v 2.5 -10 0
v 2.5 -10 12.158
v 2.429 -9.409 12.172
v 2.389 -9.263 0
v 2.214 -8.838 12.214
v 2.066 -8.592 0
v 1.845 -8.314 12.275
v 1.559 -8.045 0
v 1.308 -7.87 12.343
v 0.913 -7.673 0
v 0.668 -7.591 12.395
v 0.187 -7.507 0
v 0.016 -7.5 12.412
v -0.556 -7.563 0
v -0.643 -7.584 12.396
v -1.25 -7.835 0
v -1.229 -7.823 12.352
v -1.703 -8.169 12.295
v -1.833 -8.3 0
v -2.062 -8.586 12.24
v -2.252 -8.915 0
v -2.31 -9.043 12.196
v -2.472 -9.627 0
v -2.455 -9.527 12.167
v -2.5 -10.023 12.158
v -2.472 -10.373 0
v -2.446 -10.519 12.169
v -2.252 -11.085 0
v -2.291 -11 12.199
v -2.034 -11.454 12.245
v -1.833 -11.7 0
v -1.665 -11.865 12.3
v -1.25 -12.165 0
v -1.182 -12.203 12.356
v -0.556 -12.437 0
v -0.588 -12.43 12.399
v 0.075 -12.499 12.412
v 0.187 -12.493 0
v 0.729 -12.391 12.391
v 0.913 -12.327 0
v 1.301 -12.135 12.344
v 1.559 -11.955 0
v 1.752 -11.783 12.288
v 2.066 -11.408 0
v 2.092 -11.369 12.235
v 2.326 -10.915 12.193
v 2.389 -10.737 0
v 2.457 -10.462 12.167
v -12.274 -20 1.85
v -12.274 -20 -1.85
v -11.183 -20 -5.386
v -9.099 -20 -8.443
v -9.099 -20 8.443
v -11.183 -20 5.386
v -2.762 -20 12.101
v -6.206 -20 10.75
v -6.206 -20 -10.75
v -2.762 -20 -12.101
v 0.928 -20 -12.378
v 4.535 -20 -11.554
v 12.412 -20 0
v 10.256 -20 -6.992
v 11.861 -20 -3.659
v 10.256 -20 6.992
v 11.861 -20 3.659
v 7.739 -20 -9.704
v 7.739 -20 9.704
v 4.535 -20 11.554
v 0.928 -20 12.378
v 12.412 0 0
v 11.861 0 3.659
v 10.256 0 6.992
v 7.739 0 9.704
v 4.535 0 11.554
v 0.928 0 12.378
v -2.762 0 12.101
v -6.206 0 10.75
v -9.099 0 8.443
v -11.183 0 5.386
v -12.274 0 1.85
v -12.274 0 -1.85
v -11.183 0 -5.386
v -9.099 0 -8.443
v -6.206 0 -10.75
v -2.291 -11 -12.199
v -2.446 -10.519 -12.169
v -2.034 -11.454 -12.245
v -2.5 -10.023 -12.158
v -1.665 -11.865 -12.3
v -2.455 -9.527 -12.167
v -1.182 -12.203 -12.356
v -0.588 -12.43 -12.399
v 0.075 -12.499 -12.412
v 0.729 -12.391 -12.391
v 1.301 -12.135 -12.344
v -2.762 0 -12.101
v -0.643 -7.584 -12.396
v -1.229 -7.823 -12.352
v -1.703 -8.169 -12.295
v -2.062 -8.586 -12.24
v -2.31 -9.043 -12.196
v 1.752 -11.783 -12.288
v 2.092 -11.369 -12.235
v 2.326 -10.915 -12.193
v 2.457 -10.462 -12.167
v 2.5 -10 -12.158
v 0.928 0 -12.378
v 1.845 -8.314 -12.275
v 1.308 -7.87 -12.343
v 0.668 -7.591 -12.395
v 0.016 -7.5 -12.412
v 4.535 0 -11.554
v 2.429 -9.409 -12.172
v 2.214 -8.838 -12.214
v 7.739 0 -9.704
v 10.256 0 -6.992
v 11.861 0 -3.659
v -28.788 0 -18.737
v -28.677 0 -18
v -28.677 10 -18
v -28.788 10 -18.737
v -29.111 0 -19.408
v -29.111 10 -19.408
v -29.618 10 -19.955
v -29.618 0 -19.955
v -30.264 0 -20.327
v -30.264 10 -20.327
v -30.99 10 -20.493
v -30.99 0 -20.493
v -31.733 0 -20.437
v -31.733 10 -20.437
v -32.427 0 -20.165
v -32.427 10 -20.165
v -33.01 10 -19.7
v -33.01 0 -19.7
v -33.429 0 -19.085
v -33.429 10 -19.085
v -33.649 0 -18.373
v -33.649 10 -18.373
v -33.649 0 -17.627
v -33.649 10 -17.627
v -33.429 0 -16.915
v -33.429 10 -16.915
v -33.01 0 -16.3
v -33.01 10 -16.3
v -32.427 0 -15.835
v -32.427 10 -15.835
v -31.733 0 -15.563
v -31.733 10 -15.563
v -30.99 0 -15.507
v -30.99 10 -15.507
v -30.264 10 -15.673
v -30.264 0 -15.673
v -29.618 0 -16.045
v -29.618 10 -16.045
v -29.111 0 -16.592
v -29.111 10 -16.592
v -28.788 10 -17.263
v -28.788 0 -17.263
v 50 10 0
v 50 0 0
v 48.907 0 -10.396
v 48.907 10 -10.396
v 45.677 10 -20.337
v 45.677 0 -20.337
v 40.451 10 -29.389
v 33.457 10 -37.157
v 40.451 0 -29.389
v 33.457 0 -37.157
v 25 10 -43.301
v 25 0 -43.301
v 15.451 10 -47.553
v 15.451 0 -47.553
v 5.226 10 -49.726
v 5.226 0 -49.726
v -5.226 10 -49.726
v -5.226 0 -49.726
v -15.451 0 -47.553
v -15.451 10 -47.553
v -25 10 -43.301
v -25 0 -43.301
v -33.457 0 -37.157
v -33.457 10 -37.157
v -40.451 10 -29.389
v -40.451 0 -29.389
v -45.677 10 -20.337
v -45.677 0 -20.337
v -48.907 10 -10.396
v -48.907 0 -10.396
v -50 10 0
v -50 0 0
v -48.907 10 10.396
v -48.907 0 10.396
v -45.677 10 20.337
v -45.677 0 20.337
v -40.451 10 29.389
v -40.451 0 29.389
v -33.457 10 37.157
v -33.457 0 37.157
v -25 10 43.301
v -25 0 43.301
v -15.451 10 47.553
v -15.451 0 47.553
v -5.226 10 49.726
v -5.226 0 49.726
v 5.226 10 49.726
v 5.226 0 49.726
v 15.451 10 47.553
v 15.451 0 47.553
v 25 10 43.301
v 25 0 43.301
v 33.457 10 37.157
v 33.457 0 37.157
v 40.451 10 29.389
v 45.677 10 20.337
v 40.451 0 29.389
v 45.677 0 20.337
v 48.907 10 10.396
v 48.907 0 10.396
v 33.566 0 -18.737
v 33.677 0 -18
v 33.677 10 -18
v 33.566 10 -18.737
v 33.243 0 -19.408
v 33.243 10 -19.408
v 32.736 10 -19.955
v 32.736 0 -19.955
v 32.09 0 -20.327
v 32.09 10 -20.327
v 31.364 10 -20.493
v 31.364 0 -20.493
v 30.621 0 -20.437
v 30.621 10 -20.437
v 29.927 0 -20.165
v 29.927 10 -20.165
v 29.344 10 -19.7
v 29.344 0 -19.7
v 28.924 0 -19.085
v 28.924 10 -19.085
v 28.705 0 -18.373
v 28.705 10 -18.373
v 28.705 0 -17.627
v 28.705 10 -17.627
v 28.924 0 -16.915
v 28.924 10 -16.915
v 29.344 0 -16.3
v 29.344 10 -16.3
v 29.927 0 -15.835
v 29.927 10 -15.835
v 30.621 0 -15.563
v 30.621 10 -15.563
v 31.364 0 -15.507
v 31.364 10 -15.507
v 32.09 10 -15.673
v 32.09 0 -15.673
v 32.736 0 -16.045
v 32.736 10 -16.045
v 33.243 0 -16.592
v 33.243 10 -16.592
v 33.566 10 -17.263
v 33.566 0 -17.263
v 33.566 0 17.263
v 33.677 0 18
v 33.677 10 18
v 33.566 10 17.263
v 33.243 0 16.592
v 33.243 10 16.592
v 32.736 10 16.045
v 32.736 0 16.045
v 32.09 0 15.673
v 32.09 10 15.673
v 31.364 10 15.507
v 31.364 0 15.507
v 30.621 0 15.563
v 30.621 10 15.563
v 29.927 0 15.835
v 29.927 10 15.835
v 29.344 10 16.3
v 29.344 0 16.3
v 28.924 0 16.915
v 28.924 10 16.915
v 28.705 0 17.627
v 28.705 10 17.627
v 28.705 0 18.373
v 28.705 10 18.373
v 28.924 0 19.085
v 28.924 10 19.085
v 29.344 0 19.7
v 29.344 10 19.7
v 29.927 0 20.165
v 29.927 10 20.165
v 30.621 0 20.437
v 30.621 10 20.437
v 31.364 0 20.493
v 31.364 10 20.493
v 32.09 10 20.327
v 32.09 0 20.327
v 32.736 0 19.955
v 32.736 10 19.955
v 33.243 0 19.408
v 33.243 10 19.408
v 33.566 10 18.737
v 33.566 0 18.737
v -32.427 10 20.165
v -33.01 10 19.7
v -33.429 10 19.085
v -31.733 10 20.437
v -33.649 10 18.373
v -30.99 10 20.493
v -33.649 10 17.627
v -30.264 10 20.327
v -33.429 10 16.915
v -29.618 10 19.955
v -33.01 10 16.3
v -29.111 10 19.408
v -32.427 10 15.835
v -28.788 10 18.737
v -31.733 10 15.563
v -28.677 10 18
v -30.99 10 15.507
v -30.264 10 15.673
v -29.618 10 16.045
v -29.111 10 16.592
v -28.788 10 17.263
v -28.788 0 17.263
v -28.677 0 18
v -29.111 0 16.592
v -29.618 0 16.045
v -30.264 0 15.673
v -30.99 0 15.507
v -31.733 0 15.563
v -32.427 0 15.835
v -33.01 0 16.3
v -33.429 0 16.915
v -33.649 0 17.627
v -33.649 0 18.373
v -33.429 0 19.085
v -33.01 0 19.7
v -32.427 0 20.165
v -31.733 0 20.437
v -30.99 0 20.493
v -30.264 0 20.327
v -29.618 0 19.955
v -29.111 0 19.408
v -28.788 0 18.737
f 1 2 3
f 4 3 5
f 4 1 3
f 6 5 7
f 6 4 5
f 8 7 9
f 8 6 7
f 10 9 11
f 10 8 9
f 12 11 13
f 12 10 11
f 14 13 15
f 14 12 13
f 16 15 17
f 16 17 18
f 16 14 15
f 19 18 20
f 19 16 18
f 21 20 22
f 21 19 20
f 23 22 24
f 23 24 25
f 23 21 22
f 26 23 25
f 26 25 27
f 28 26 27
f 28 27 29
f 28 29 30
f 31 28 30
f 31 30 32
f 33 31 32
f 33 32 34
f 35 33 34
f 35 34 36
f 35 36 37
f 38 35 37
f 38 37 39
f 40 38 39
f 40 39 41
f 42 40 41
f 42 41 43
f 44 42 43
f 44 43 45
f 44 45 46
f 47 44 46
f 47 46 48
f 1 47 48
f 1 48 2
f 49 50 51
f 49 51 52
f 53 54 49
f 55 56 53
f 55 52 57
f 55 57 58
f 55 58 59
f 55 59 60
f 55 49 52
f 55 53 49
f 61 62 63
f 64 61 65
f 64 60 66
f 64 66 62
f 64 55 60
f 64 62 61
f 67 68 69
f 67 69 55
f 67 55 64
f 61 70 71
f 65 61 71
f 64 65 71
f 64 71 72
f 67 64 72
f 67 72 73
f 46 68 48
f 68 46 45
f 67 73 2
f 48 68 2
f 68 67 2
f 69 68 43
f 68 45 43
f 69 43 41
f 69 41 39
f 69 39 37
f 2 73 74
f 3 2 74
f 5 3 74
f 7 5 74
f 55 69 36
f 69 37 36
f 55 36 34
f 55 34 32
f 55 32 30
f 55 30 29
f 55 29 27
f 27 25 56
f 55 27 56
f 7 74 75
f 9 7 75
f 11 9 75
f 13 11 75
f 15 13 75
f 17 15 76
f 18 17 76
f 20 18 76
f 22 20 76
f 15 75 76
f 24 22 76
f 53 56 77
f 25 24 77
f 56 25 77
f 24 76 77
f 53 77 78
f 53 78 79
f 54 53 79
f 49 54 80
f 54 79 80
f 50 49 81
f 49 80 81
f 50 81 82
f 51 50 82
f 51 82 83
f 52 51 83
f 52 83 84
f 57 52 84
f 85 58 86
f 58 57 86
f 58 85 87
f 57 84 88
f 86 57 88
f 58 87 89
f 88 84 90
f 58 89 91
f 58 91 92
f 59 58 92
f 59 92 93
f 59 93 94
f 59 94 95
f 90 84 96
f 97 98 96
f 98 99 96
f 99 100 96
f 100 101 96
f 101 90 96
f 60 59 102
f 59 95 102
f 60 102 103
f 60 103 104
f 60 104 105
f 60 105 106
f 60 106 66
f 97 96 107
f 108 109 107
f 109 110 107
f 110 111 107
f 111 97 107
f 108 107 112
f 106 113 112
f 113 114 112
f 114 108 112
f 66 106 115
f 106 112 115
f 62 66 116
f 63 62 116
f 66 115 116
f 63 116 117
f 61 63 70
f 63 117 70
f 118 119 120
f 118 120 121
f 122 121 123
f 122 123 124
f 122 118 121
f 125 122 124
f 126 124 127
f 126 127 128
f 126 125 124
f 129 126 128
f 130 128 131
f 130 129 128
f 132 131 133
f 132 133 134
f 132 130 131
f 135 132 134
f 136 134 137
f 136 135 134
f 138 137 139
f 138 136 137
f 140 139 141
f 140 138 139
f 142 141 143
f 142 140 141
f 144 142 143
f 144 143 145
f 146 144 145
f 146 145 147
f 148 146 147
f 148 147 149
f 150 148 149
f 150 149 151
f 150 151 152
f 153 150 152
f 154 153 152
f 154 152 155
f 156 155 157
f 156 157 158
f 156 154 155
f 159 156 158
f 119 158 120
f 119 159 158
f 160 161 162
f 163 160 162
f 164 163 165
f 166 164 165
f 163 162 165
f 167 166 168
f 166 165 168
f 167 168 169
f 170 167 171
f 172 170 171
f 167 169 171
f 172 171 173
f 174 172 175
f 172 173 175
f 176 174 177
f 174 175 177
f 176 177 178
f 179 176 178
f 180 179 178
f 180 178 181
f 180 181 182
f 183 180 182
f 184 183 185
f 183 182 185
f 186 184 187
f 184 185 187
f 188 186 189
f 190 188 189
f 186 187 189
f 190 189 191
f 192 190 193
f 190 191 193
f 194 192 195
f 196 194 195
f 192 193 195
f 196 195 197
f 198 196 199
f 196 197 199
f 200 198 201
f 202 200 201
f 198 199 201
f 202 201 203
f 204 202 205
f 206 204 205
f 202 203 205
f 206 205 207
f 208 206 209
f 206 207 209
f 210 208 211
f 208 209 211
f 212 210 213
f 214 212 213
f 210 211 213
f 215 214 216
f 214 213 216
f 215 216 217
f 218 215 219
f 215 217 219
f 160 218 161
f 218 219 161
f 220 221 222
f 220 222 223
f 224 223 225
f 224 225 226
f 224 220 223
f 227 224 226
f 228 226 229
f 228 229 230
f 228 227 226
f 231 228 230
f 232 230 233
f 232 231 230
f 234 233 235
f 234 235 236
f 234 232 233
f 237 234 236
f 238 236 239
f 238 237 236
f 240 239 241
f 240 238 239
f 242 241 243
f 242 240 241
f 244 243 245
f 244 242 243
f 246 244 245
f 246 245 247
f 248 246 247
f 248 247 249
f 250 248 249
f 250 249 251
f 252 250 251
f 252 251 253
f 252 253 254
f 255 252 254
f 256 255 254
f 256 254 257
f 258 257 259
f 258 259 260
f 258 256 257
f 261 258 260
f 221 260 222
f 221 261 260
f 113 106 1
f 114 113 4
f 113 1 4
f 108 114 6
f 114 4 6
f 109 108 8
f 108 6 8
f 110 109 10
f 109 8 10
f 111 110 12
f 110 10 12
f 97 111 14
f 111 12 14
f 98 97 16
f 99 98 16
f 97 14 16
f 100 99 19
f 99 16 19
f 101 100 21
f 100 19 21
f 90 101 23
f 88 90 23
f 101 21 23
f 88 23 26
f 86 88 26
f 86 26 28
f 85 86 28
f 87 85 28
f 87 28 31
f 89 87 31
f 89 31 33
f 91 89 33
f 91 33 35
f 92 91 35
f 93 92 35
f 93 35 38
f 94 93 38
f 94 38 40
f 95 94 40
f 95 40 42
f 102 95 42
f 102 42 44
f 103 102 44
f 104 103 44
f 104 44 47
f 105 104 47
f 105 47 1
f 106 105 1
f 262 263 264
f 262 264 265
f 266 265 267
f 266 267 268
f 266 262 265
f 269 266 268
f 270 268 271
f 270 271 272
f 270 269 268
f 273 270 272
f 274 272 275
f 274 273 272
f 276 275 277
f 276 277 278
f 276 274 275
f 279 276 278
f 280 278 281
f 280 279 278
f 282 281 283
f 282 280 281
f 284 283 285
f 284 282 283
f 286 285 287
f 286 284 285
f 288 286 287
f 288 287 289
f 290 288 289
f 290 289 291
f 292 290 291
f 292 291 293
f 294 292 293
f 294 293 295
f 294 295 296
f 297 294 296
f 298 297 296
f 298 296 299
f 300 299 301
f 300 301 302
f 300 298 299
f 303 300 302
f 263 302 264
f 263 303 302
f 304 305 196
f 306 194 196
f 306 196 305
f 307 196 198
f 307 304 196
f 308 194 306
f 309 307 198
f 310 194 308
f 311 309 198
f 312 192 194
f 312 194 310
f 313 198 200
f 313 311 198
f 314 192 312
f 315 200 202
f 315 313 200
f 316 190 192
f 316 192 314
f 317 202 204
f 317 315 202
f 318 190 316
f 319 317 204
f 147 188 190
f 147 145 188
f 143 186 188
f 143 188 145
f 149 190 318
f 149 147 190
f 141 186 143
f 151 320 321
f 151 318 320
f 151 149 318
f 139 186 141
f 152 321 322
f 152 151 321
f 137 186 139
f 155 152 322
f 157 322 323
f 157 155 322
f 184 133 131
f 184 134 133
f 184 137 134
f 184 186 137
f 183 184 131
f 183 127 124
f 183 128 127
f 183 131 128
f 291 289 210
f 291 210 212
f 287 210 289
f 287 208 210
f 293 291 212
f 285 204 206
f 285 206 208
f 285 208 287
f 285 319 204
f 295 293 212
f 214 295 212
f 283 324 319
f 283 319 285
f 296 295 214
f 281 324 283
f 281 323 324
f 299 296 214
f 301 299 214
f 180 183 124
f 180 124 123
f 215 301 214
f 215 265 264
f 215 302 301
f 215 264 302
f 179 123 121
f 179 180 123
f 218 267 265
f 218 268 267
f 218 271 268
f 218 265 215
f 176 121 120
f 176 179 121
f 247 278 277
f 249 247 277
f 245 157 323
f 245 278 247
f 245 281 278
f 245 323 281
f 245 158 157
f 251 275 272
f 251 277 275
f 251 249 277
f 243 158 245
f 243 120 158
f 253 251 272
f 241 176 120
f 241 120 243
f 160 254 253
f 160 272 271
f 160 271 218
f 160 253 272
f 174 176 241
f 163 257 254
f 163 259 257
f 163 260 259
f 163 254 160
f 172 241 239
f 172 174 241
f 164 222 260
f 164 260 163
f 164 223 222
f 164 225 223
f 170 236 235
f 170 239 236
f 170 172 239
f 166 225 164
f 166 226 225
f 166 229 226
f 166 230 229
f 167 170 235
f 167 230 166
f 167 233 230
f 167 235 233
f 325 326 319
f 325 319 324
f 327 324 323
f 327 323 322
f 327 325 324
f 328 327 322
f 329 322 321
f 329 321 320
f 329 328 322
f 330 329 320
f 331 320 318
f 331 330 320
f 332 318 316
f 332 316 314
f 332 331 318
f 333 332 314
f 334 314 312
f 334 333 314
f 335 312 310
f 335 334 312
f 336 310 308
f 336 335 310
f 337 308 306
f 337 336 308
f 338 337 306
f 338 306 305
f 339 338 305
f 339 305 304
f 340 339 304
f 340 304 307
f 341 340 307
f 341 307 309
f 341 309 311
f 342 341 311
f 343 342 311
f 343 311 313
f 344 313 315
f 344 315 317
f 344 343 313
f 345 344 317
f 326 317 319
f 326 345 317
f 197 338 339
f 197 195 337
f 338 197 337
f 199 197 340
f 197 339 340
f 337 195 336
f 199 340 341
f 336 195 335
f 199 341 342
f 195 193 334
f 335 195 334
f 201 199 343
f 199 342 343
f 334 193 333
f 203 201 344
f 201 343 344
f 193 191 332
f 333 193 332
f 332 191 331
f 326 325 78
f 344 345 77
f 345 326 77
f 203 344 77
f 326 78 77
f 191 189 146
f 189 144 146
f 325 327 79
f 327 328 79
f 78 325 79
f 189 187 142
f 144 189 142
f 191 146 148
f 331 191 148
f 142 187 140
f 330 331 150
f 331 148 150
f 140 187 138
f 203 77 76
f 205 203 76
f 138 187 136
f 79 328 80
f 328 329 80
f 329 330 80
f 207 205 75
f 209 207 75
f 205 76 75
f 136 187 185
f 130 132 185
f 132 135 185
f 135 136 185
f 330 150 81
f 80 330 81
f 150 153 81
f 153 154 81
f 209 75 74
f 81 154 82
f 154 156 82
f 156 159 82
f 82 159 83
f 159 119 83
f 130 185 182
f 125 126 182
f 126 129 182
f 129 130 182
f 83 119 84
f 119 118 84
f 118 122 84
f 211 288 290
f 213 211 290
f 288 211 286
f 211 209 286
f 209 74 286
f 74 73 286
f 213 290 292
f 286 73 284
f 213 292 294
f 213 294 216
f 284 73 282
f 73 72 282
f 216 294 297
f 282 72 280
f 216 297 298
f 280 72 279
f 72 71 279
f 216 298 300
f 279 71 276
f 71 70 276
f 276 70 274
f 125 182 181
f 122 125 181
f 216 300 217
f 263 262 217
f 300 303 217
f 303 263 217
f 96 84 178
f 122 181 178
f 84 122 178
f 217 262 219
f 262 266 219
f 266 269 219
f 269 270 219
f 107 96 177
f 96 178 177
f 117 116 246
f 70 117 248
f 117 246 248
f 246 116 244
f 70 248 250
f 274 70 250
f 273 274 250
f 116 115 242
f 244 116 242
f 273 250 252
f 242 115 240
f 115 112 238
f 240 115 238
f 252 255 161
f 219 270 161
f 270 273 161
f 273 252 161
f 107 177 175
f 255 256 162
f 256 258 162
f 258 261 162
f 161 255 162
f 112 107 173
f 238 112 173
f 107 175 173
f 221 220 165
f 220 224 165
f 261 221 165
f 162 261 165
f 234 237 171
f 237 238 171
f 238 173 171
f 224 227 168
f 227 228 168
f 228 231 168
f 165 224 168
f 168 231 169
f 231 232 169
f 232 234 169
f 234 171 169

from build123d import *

# Parameters (mm, degrees)
SKETCH2_R               = 50
SKETCH2_R_2             = 2.5
BOSS_EXTRUDE1_DEPTH     = 10
SKETCH3_R               = 12.4125
BOSS_EXTRUDE2_DEPTH     = 20
SKETCH4_R               = 2.5
CUT_EXTRUDE1_DEPTH      = 51
CUT_EXTRUDE1_DEPTH_BACK = 51


with BuildPart() as part:
    # Sketch2 → Boss-Extrude1 (new body)
    with BuildSketch(Plane(origin=(0, 0, 0), x_dir=(1, 0, 0), z_dir=(0, 1, 0))):
        Circle(SKETCH2_R)
        with Locations((-31.176914536, 18)):
            Circle(SKETCH2_R_2, mode=Mode.SUBTRACT)
        with Locations((-31.176914536, -18)):
            Circle(SKETCH2_R_2, mode=Mode.SUBTRACT)
        with Locations((31.176914536, 18)):
            Circle(SKETCH2_R_2, mode=Mode.SUBTRACT)
        with Locations((31.176914536, -18)):
            Circle(SKETCH2_R_2, mode=Mode.SUBTRACT)
    extrude(amount=BOSS_EXTRUDE1_DEPTH)

    # Sketch3 → Boss-Extrude2 (add)
    with BuildSketch(Plane.XZ):
        Circle(SKETCH3_R)
    extrude(amount=BOSS_EXTRUDE2_DEPTH)

    # Sketch4 → Cut-Extrude1 (cut, two sides)
    with BuildSketch(Plane.XY) as cut_extrude1_sk:
        with Locations((0, -10)):
            Circle(SKETCH4_R)
    extrude(amount=CUT_EXTRUDE1_DEPTH, mode=Mode.SUBTRACT)
    extrude(cut_extrude1_sk.sketch, amount=-CUT_EXTRUDE1_DEPTH_BACK, mode=Mode.SUBTRACT)


solid = part.part
